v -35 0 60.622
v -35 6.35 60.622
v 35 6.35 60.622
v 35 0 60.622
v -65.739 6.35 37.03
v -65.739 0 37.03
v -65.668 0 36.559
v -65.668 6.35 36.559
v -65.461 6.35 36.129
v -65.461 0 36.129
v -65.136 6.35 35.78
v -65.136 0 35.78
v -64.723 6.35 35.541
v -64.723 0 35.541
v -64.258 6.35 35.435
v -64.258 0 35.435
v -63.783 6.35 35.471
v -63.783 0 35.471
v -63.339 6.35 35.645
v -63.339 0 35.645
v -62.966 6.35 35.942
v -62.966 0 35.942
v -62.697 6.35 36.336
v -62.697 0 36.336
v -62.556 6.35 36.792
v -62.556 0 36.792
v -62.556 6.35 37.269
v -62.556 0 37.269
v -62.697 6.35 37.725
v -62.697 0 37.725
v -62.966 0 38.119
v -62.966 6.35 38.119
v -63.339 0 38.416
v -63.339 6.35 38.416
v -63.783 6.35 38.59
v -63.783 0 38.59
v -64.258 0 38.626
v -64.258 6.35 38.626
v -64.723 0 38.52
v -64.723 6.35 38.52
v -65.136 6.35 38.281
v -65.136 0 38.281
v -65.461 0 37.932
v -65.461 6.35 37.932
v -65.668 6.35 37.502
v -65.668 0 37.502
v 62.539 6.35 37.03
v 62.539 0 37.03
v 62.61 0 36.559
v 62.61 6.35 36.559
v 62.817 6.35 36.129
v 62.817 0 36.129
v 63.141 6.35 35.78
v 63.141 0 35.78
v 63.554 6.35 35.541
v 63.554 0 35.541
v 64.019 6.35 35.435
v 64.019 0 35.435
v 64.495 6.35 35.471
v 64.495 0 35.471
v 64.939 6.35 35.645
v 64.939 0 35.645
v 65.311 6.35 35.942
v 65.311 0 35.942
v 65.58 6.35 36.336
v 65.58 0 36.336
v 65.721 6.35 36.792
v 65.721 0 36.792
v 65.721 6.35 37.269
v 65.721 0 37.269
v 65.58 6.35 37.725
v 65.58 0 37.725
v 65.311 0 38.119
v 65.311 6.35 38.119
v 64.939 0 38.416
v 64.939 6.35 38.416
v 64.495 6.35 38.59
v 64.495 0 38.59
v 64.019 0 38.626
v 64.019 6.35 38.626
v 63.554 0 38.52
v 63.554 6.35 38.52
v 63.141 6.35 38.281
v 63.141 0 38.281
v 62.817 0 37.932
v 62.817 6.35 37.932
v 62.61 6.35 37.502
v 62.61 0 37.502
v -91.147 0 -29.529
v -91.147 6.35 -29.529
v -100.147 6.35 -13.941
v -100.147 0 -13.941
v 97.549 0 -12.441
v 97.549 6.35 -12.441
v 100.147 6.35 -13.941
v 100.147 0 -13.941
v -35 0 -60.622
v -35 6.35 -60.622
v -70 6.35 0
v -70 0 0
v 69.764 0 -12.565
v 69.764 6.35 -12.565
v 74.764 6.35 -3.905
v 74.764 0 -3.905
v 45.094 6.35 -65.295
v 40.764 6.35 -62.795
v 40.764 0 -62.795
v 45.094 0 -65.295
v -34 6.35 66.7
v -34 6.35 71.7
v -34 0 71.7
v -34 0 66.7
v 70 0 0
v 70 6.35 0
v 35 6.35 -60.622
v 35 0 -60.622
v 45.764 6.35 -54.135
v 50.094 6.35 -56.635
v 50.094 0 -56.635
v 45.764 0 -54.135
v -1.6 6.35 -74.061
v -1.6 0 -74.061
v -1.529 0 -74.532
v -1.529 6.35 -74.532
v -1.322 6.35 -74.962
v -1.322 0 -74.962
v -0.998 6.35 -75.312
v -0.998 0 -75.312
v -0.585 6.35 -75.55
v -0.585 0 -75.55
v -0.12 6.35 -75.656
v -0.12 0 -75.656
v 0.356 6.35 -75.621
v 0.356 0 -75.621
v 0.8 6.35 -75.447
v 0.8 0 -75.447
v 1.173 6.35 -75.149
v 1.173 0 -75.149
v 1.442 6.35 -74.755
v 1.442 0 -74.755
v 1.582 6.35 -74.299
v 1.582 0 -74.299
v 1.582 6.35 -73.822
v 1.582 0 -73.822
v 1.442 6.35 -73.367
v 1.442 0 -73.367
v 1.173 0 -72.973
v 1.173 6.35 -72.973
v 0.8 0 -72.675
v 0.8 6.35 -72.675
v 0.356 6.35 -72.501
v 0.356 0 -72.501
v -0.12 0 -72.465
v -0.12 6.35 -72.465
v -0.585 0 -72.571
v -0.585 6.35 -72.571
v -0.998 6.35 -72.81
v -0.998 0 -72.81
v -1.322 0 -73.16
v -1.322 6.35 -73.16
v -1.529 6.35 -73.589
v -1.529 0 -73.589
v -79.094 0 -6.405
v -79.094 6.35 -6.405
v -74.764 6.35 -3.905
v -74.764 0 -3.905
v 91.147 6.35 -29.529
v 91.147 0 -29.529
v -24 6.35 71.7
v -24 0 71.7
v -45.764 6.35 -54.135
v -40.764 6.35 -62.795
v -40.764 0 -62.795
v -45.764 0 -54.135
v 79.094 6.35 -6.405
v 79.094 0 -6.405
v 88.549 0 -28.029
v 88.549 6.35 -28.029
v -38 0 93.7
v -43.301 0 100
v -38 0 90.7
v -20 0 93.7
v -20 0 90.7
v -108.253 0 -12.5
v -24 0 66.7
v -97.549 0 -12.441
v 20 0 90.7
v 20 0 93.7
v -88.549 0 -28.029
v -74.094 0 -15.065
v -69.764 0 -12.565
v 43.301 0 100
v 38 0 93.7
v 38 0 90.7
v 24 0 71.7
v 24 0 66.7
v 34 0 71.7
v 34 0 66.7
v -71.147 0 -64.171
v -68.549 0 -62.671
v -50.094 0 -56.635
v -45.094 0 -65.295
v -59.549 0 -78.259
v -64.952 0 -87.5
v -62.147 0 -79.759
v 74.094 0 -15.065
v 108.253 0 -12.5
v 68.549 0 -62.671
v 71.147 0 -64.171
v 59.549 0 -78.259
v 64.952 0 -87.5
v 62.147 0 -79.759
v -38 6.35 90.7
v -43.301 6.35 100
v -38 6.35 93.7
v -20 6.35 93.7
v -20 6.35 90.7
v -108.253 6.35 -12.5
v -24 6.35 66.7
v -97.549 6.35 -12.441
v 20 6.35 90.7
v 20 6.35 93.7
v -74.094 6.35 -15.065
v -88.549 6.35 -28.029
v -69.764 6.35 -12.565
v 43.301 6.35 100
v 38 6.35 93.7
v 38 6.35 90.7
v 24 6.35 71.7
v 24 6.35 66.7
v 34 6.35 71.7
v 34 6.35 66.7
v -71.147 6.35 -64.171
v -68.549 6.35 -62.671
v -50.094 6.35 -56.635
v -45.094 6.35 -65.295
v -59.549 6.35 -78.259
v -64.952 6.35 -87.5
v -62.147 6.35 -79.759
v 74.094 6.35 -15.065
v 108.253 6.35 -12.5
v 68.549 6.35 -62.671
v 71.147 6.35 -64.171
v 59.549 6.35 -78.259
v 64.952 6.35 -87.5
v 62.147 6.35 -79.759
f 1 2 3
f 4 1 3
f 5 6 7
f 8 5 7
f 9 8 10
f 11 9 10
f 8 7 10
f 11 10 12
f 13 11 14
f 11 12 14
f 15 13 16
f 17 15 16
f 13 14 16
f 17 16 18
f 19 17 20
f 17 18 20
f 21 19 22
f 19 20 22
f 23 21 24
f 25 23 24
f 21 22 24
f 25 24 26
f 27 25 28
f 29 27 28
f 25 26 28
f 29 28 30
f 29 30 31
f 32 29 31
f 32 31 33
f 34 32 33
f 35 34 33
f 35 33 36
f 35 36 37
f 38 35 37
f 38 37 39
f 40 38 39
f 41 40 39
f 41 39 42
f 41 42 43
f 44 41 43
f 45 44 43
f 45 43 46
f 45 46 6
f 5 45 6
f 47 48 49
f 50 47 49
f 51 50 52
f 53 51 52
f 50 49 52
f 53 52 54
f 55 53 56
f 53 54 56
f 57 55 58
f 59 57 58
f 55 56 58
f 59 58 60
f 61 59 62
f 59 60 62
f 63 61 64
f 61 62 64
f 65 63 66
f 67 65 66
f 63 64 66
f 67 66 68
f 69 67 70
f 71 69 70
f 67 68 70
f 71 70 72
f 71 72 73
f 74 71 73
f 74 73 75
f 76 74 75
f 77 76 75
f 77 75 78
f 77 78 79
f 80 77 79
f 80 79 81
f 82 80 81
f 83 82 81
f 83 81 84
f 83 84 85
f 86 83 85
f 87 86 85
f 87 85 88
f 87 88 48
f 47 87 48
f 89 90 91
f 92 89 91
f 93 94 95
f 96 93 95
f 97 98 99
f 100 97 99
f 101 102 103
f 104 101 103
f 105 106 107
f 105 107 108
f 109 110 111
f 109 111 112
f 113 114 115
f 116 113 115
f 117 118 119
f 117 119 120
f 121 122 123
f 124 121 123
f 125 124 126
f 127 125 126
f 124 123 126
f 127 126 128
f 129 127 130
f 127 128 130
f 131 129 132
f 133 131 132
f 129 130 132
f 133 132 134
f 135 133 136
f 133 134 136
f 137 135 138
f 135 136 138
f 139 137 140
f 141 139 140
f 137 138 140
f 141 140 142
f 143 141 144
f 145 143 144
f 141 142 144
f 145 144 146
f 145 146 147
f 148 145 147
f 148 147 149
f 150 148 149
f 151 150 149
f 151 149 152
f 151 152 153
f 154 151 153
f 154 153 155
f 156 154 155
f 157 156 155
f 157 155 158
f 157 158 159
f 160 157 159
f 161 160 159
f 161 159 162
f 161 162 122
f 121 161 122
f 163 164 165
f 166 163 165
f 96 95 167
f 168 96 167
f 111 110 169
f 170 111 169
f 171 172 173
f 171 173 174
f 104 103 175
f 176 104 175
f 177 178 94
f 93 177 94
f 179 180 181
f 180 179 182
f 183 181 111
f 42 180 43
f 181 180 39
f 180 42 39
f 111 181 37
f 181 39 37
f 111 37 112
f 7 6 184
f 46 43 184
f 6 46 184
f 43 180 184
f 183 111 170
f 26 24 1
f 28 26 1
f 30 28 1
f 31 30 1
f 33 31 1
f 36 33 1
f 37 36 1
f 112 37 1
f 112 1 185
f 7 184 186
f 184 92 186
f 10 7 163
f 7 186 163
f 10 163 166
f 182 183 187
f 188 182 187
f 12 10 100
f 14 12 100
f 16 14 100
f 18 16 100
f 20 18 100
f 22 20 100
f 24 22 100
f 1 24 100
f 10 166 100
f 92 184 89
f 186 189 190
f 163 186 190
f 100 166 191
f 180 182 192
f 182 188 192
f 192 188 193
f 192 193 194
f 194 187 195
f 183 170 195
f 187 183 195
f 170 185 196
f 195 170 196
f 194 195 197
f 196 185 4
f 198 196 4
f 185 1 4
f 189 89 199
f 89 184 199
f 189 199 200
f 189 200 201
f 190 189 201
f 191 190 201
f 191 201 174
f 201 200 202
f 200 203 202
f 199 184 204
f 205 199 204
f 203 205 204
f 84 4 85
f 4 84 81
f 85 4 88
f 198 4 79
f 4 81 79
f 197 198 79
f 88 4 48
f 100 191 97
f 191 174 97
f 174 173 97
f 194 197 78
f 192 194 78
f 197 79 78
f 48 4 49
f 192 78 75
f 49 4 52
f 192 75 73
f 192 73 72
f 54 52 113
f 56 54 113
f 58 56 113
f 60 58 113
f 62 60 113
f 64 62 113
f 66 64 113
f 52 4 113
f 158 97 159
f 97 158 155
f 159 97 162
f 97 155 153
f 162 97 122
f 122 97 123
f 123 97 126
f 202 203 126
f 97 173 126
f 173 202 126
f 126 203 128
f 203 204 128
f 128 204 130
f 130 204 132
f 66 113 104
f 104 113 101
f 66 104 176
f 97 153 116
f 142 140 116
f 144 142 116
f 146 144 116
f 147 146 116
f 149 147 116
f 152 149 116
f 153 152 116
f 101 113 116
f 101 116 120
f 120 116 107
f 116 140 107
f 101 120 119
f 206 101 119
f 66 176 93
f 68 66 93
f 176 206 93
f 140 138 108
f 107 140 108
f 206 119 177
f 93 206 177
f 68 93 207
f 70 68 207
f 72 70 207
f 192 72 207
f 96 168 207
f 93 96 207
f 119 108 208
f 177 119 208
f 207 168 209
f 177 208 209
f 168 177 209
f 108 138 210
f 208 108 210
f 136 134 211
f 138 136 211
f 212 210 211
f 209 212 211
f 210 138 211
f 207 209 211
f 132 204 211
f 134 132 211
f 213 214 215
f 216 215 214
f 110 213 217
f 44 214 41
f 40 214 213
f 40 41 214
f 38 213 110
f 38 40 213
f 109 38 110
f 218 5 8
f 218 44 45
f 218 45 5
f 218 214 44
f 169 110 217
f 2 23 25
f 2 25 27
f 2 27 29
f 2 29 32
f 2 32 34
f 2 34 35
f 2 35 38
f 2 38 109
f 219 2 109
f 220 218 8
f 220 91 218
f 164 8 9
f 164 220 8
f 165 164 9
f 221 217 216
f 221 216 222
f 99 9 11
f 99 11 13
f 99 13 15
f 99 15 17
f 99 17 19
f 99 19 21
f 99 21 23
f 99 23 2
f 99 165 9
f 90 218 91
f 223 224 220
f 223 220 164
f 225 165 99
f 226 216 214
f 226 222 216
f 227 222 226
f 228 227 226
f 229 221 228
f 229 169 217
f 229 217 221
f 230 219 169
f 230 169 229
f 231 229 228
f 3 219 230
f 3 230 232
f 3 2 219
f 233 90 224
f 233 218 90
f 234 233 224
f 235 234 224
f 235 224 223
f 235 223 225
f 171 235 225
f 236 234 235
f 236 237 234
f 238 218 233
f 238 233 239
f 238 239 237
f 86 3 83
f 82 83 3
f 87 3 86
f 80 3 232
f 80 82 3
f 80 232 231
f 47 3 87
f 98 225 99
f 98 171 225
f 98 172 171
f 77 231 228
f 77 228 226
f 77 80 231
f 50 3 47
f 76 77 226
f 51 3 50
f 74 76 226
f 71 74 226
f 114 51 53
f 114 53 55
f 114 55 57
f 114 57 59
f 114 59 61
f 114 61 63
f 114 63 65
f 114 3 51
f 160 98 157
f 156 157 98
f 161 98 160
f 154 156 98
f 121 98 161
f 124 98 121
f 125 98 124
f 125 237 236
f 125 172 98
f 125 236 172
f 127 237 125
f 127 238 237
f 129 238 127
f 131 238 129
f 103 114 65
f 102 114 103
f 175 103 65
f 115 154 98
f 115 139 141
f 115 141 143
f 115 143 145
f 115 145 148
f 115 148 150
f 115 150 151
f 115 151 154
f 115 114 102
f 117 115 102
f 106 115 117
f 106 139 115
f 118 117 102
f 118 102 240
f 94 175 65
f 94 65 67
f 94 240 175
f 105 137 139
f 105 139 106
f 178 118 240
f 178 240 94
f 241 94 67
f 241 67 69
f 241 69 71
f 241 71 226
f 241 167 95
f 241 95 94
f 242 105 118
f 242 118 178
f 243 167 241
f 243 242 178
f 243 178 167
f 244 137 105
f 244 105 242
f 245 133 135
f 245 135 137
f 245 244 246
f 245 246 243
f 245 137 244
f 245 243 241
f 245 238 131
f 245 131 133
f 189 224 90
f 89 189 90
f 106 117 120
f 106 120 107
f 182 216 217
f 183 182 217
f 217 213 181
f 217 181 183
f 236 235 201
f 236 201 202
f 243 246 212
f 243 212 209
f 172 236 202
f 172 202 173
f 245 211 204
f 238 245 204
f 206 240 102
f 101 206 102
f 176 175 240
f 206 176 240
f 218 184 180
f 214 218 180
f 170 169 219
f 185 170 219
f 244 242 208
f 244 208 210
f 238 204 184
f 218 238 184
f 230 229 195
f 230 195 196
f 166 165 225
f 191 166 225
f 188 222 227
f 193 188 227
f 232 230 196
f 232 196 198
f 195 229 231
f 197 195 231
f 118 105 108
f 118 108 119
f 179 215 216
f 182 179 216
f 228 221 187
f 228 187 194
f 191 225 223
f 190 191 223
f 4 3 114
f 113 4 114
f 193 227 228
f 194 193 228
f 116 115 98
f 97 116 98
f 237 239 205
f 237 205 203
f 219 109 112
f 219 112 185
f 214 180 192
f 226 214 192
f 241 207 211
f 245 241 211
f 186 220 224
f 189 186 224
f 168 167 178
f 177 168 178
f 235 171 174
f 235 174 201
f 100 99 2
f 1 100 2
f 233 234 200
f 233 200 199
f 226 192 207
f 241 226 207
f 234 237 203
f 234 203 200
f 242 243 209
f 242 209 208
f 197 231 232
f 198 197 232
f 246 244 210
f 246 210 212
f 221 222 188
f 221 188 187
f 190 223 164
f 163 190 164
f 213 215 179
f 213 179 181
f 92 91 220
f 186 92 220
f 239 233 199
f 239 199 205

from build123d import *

# Parameters (mm, degrees)
BOSS_EXTRUDE1_DEPTH   = 6.35
SKETCH2_W             = 18
SKETCH2_H             = 3
SKETCH2_W_2           = 10
SKETCH2_H_2           = 5
CUT_EXTRUDE1_DEPTH    = 148.509567486
CUT_EXTRUDE2_DEPTH    = 148.509567486
F_3_0MM_DOWEL_HOLE1_D = 3.2


with BuildPart() as part:
    # Sketch1 → Boss-Extrude1 (new body)
    with BuildSketch(Plane(origin=(0, 0, 0), x_dir=(1, 0, 0), z_dir=(0, 1, 0))):
        Polygon((64.951905284, 87.5), (-64.951905284, 87.5), (-108.253175473, 12.5), (-43.301270189, -100), (43.301270189, -100), (108.253175473, 12.5), align=None)
    extrude(amount=BOSS_EXTRUDE1_DEPTH)

    # Sketch2 → Cut-Extrude1 (cut, through all)
    with BuildSketch(Plane(origin=(0, 6.35, 0), x_dir=(1, 0, 0), z_dir=(0, 1, 0))):
        with Locations((-29, -92.2)):
            Rectangle(SKETCH2_W, SKETCH2_H)
        with Locations((29, -92.2)):
            Rectangle(SKETCH2_W, SKETCH2_H)
        Polygon((-62.146580335, 79.758965344), (-59.548504123, 78.258965344), (-68.548504123, 62.670508076), (-71.146580335, 64.170508076), align=None)
        Polygon((-97.548504123, 12.441034656), (-88.548504123, 28.029491924), (-91.146580335, 29.529491924), (-100.146580335, 13.941034656), align=None)
        Polygon((100.146580335, 13.941034656), (91.146580335, 29.529491924), (88.548504123, 28.029491924), (97.548504123, 12.441034656), align=None)
        Polygon((59.548504123, 78.258965344), (62.146580335, 79.758965344), (71.146580335, 64.170508076), (68.548504123, 62.670508076), align=None)
        with Locations((-29, -69.2)):
            Rectangle(SKETCH2_W_2, SKETCH2_H_2)
        with Locations((29, -69.2)):
            Rectangle(SKETCH2_W_2, SKETCH2_H_2)
        Polygon((79.094021451, 6.405136271), (74.094021451, 15.065390309), (69.763894432, 12.565390309), (74.763894432, 3.905136271), align=None)
        Polygon((40.763894432, 62.794863729), (45.094021451, 65.294863729), (50.094021451, 56.634609691), (45.763894432, 54.134609691), align=None)
        Polygon((-74.763894432, 3.905136271), (-69.763894432, 12.565390309), (-74.094021451, 15.065390309), (-79.094021451, 6.405136271), align=None)
        Polygon((-45.094021451, 65.294863729), (-40.763894432, 62.794863729), (-45.763894432, 54.134609691), (-50.094021451, 56.634609691), align=None)
    extrude(amount=-CUT_EXTRUDE1_DEPTH, mode=Mode.SUBTRACT)

    # Sketch4 → Cut-Extrude2 (cut, through all)
    with BuildSketch(Plane(origin=(0, 6.35, 0), x_dir=(1, 0, 0), z_dir=(0, 1, 0))):
        Polygon((35, -60.621778265), (70, 0), (35, 60.621778265), (-35, 60.621778265), (-70, 0), (-35, -60.621778265), align=None)
    extrude(amount=-CUT_EXTRUDE2_DEPTH, mode=Mode.SUBTRACT)

    # Ø3.0mm Dowel Hole1 (through all)
    with Locations(Plane(origin=(0, 6.35, 0), x_dir=(1, 0, 0), z_dir=(0, 1, 0))):
        with Locations((0, 74.060889132), (-64.138611416, -37.030444566), (64.138611416, -37.030444566)):
            Hole(F_3_0MM_DOWEL_HOLE1_D / 2)


solid = part.part
